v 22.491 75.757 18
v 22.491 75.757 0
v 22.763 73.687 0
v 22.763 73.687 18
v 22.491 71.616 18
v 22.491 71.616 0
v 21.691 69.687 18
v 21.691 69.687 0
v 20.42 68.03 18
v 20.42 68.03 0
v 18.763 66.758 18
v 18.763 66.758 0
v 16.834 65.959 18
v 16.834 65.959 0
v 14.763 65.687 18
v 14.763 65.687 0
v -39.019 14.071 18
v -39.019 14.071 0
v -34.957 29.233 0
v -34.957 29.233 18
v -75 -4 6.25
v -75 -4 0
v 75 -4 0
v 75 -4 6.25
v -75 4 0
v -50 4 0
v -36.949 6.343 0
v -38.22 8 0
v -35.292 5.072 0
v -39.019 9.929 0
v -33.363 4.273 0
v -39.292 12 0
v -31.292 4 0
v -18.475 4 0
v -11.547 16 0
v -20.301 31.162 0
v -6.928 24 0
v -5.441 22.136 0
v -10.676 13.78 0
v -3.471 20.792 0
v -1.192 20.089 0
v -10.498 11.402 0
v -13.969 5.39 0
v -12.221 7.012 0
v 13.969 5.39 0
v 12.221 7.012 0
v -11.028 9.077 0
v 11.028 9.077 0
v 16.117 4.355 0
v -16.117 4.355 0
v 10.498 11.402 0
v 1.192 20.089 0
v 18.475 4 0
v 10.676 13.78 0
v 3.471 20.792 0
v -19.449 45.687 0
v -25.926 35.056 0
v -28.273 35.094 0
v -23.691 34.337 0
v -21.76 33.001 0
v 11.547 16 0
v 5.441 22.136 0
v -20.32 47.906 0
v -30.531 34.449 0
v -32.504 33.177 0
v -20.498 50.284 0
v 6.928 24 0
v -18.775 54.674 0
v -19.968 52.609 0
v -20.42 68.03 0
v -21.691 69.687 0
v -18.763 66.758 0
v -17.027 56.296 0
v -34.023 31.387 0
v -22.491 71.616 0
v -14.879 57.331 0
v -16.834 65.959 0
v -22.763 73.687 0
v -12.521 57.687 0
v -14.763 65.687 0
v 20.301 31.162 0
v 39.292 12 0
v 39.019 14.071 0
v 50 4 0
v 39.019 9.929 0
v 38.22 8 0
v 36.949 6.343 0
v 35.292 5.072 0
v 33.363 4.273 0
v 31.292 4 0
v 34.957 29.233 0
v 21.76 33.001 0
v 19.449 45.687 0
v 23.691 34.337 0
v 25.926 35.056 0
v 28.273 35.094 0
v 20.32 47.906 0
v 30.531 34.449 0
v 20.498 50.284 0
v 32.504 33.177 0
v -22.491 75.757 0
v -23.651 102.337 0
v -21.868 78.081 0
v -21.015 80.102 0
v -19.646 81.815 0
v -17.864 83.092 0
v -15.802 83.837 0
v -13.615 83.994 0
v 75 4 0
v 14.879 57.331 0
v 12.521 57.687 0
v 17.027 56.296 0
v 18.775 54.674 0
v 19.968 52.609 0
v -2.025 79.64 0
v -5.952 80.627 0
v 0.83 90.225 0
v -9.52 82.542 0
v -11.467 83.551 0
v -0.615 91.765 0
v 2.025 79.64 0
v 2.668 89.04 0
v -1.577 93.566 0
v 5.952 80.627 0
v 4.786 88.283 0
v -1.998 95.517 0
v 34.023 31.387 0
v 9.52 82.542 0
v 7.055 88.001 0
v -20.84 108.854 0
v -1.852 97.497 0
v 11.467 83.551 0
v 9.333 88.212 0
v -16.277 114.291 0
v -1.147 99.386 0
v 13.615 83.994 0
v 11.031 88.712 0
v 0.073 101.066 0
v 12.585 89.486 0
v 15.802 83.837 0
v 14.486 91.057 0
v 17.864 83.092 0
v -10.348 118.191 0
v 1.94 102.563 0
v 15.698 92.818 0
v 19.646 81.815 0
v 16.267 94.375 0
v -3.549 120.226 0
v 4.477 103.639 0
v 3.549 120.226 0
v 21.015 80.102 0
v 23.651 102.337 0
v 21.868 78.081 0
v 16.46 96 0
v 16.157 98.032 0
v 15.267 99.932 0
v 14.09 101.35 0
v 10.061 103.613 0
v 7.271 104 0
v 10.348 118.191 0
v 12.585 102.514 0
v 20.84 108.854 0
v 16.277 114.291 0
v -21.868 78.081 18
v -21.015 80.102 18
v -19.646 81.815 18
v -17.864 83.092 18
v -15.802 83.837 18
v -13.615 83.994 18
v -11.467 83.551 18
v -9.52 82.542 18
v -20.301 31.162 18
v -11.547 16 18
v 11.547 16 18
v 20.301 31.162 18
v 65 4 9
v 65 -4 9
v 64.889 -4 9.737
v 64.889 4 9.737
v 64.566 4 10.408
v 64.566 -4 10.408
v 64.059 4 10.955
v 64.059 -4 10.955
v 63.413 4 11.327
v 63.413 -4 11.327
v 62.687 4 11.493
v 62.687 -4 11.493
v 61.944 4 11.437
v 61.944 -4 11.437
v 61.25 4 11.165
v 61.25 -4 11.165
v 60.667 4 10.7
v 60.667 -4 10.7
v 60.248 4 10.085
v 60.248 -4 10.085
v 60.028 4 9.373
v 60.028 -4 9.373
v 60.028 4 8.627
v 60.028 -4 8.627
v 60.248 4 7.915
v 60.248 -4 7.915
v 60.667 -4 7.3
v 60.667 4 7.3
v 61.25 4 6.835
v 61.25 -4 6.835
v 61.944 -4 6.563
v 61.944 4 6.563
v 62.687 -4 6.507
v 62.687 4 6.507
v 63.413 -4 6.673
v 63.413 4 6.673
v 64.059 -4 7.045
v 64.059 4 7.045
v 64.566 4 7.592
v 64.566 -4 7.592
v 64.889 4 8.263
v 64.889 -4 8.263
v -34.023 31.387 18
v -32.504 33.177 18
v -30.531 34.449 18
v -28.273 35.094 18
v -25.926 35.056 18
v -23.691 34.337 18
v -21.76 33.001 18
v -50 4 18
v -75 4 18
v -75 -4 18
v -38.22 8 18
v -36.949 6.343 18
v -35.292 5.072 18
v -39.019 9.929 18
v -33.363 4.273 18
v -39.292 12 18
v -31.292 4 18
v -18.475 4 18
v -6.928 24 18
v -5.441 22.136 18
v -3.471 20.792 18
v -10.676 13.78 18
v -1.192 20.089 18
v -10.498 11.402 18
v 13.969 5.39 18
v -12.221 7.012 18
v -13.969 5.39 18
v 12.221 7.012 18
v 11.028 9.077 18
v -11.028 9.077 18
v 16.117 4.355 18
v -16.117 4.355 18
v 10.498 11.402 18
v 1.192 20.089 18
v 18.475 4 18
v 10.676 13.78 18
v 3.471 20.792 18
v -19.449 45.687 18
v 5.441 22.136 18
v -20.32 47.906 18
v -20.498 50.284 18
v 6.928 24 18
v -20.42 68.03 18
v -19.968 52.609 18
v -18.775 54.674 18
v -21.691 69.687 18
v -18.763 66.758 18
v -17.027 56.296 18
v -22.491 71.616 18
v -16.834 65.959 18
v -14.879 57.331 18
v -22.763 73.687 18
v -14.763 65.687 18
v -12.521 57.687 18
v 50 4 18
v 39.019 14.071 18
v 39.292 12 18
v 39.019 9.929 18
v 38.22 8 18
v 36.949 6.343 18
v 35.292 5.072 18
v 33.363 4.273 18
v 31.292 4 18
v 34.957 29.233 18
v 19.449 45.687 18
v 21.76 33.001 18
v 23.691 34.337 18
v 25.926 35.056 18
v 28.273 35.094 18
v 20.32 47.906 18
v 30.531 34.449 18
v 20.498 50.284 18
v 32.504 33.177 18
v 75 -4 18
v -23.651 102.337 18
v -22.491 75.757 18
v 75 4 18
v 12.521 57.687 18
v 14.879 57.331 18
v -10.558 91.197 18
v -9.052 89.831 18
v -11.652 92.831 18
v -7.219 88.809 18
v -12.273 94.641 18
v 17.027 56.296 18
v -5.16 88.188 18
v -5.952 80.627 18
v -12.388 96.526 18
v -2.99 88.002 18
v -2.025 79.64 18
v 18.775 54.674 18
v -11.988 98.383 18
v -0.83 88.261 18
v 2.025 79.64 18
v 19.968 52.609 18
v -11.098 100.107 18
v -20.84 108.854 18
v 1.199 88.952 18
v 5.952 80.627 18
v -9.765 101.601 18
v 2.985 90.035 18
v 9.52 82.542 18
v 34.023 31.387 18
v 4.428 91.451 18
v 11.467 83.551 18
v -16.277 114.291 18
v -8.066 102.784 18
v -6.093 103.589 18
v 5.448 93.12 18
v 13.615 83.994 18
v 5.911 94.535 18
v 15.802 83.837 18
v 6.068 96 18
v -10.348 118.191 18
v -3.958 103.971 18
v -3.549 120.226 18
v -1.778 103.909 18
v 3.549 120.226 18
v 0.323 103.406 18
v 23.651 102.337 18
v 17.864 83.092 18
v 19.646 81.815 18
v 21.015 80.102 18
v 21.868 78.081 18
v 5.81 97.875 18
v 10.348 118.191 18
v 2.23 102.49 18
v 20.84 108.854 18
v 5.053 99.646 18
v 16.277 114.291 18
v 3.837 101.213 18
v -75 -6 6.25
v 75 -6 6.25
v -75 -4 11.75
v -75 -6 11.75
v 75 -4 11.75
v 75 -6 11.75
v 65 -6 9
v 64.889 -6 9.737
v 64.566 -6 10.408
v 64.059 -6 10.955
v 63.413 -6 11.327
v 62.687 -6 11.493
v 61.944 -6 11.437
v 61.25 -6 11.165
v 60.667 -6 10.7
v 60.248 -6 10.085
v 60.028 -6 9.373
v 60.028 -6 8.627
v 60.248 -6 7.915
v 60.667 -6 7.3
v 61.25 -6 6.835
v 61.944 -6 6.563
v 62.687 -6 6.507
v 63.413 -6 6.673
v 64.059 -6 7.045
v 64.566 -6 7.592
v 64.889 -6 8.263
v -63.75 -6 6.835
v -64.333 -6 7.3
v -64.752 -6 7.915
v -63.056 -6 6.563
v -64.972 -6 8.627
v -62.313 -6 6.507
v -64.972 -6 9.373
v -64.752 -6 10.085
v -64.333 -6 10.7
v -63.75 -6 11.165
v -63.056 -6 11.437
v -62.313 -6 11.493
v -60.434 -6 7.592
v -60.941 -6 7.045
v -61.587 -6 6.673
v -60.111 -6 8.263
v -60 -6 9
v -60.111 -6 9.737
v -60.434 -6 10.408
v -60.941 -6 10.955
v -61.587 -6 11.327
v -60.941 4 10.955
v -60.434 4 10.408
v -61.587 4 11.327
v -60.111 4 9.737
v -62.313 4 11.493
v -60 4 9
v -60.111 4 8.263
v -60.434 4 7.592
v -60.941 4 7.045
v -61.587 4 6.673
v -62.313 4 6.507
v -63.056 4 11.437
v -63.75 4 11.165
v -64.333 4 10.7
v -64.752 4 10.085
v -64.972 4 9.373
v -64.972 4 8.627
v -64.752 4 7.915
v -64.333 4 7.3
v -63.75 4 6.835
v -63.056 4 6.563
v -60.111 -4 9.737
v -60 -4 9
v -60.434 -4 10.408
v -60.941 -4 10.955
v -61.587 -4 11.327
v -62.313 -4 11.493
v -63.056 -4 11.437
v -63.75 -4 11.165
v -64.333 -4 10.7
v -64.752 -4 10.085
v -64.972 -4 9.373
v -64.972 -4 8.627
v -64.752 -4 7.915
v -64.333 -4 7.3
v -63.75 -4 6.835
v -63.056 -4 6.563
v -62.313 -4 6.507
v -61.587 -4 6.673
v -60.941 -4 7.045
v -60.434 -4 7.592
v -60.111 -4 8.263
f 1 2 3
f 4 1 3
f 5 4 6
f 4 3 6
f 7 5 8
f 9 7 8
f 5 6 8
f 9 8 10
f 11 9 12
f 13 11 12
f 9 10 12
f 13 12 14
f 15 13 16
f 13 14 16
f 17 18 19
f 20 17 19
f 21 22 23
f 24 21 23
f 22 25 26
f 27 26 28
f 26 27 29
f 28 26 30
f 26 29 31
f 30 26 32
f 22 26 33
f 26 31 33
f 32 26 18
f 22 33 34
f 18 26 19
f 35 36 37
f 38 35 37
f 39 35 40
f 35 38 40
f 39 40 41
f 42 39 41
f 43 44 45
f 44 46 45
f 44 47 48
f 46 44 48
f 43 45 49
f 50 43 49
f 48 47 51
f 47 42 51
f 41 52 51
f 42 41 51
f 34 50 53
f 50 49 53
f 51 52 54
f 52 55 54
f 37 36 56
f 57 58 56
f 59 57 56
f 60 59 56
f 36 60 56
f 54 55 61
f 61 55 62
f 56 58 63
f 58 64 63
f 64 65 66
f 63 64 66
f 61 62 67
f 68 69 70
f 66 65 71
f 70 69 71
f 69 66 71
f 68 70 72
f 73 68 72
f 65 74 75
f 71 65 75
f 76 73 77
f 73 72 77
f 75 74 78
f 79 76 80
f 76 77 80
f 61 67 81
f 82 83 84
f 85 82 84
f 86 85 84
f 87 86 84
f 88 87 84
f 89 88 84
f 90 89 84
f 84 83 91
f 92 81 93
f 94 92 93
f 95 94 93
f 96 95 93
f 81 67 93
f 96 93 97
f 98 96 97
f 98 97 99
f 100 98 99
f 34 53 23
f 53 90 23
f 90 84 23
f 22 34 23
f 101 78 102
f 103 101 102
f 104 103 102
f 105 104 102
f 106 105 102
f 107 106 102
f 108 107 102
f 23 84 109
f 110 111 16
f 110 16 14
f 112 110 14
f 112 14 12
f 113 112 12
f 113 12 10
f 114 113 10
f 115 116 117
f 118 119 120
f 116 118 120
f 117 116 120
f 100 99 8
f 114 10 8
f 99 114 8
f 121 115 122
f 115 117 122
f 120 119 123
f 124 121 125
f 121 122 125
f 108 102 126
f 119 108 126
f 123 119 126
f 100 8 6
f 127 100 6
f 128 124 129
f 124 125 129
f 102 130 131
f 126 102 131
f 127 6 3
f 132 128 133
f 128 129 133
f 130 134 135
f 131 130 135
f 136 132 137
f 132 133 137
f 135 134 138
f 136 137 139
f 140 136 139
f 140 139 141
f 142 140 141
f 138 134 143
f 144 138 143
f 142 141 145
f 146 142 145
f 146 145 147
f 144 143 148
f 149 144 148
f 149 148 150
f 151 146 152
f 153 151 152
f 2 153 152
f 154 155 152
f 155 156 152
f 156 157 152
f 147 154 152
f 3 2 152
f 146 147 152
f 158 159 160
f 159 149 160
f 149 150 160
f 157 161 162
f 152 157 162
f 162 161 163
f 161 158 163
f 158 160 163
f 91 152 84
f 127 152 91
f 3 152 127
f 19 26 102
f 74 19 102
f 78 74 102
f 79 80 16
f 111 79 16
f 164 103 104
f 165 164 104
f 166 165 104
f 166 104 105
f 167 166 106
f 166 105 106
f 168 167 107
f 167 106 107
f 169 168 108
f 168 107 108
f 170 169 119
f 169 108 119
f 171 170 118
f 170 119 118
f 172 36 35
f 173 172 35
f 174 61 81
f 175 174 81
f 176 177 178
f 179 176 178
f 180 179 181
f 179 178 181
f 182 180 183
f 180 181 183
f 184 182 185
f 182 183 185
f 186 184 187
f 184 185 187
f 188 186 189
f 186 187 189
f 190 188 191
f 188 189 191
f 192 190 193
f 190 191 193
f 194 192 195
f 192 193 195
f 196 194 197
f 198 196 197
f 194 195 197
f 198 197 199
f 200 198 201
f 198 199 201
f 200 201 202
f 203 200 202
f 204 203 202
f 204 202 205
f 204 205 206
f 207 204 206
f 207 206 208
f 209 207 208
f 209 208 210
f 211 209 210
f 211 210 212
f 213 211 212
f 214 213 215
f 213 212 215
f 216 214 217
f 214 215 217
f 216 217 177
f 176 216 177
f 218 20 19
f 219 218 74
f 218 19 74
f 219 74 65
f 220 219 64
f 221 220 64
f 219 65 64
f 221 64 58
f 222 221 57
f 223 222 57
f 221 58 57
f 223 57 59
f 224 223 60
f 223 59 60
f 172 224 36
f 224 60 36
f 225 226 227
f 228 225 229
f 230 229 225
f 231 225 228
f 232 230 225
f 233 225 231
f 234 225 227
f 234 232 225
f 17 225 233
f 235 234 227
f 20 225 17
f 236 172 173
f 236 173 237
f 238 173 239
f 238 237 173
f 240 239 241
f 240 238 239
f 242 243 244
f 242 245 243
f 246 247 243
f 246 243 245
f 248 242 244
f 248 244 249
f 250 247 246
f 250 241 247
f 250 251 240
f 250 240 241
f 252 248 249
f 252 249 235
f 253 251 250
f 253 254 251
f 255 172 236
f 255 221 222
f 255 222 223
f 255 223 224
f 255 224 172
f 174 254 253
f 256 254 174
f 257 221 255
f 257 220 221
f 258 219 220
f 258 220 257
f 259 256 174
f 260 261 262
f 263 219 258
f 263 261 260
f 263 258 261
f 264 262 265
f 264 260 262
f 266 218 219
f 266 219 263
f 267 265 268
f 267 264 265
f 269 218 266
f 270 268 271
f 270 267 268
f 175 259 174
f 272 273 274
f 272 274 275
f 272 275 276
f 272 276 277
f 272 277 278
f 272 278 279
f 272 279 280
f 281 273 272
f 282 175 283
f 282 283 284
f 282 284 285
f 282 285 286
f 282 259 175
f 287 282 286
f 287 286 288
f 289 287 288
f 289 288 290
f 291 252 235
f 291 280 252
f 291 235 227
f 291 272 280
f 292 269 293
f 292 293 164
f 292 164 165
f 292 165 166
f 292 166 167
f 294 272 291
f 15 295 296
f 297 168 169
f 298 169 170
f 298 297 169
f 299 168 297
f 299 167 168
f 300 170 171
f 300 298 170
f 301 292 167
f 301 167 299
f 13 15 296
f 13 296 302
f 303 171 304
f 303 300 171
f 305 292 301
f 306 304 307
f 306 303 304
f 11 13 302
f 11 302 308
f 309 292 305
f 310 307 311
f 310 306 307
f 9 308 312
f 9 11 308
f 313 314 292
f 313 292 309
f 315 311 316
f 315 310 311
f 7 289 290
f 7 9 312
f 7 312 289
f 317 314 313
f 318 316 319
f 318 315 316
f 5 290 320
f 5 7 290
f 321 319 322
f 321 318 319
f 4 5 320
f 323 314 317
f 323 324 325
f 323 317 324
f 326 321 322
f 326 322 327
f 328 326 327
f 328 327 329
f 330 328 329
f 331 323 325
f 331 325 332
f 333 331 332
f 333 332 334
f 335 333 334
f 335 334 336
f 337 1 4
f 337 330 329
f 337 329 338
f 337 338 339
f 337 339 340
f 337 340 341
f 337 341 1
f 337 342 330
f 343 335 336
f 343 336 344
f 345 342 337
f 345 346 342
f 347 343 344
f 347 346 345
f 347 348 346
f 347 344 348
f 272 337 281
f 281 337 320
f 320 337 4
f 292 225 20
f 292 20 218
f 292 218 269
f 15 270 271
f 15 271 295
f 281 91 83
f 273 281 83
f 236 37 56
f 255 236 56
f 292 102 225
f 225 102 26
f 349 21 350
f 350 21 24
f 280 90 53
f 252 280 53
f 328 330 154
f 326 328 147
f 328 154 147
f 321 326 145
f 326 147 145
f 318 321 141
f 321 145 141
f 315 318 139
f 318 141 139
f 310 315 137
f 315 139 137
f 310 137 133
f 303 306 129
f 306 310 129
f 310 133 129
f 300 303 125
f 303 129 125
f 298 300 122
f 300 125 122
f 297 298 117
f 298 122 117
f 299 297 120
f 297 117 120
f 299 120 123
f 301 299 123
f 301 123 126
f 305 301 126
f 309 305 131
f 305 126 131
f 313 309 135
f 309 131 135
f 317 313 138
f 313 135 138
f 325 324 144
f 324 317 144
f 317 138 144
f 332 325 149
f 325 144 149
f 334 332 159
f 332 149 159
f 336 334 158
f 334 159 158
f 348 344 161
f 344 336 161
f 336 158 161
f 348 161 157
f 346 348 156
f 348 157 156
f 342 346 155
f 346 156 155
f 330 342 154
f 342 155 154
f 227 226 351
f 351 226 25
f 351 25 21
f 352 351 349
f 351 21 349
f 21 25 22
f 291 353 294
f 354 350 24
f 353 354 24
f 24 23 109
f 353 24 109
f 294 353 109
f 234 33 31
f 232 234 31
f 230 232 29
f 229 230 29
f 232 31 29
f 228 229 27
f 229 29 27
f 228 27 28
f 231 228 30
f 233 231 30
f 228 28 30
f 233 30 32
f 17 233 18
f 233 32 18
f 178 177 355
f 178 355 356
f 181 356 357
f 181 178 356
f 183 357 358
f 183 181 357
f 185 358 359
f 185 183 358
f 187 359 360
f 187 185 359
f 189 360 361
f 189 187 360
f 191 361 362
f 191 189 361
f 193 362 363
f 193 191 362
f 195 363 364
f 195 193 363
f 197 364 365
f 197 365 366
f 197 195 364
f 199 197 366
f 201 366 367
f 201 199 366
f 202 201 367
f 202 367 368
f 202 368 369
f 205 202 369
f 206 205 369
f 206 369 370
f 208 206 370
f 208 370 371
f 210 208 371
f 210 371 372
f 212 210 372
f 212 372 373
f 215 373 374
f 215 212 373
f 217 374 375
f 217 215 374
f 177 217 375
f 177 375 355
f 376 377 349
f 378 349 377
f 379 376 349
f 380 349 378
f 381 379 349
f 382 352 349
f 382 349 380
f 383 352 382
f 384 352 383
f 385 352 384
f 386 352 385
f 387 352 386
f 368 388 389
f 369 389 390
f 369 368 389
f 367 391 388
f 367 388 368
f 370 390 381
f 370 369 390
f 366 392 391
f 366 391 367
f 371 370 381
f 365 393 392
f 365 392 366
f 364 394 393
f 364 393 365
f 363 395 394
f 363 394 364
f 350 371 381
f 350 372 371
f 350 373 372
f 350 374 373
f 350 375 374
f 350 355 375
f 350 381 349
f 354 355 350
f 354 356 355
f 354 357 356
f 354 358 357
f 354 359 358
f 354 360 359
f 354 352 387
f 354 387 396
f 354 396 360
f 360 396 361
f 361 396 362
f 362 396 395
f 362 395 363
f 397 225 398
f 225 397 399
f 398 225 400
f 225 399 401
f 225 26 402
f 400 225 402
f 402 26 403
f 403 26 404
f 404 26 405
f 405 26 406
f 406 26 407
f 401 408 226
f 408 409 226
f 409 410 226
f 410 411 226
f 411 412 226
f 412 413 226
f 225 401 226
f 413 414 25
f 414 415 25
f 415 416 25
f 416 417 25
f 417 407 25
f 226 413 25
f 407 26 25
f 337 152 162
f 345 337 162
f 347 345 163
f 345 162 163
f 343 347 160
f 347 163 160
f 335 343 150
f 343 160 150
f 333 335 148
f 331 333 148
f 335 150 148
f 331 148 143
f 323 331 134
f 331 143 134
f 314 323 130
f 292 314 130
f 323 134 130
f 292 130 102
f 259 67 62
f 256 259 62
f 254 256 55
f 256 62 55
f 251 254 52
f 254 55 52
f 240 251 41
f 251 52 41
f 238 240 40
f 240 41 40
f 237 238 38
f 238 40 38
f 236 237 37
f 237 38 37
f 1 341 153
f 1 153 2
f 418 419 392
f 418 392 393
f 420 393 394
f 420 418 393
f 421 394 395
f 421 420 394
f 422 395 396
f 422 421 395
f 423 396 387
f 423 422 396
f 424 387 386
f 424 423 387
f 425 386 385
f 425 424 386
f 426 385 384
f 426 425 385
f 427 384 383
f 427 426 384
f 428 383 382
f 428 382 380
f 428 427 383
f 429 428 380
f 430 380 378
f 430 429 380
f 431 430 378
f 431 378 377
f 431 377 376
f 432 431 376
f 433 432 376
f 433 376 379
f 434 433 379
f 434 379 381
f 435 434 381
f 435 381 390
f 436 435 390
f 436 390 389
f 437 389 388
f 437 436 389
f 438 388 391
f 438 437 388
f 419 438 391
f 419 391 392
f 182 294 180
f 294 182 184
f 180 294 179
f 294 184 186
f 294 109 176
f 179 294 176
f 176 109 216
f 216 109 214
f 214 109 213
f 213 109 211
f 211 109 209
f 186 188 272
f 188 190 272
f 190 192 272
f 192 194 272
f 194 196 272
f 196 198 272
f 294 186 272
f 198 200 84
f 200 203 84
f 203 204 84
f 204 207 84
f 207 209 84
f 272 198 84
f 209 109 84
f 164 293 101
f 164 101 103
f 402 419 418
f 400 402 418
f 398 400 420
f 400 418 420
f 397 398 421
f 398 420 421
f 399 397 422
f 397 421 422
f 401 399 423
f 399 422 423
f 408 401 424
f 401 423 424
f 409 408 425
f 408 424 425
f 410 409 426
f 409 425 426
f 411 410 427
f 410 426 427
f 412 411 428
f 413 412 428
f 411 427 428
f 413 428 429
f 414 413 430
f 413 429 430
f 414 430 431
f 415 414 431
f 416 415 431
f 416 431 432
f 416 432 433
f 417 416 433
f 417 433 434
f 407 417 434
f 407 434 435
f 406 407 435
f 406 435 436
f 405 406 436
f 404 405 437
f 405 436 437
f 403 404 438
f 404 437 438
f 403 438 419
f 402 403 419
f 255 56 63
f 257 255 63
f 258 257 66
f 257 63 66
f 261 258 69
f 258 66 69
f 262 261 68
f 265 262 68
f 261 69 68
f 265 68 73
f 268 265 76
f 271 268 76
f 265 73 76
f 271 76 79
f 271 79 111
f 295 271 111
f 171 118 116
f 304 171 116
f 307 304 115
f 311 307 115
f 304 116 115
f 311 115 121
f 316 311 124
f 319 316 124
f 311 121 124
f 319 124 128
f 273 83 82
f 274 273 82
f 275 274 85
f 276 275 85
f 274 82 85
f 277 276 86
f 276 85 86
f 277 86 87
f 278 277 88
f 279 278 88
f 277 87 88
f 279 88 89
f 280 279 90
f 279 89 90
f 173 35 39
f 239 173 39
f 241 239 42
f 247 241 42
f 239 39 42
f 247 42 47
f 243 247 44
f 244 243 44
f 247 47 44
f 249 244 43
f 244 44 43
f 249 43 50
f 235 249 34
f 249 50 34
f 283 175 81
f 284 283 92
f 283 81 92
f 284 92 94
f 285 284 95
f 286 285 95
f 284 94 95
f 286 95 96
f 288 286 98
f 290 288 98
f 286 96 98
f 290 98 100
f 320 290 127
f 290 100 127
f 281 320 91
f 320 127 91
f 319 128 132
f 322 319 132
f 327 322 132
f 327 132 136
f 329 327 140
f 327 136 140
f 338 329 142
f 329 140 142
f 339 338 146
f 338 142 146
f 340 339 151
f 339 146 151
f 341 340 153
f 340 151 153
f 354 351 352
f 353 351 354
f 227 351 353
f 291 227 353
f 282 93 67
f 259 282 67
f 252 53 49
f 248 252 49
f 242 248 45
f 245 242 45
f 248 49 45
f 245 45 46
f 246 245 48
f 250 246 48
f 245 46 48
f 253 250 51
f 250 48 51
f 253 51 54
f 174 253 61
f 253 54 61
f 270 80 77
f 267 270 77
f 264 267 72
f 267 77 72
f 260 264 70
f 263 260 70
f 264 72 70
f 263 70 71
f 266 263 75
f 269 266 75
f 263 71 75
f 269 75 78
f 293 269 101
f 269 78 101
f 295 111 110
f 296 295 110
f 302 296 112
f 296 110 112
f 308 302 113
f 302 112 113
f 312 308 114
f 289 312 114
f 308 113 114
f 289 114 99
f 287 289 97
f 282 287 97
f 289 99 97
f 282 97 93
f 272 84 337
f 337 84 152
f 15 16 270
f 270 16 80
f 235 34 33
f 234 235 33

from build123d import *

# Parameters (mm, degrees)
F6_DEPTH       = 18
F7_W           = 150
F7_H           = 5.5
F7_R           = 2.5
F8_DEPTH       = 2
F9_DEPTH       = 8
F5_R           = 8
F10_DEPTH      = 40
F10_DEPTH_BACK = 30


with BuildPart() as f6:
    # F0 (on Top) → F6 (new body)
    with BuildSketch(Plane.XY):
        with BuildLine():
            Line((-75, -4), (75, -4))
            Line((75, -4), (75, 4))
            Line((75, 4), (50, 4))
            Line((50, 4), (23.6506350946, 102.3371685741))
            ThreePointArc((23.6506350946, 102.3371685741), (0, 120.484939165), (-23.6506350946, 102.3371685741))
            Line((-23.6506350946, 102.3371685741), (-50, 4))
            Line((-50, 4), (-75, 4))
            Line((-75, 4), (-75, -4))
        make_face()
        with BuildLine():
            ThreePointArc((-31.291987574, 4), (-37.6388142963, 7.1299085679), (-39.0193941843, 14.0705523608))
            Line((-39.0193941843, 14.0705523608), (-34.9566380514, 29.2329646678))
            ThreePointArc((-34.9566380514, 29.2329646678), (-28.2734409788, 35.0939711979), (-20.3010282108, 31.1624123069))
            Line((-20.3010282108, 31.1624123069), (-11.5470053838, 16))
            ThreePointArc((-11.5470053838, 16), (-11.5470053838, 8), (-18.4752086141, 4))
            Line((-18.4752086141, 4), (-31.291987574, 4))
        make_face(mode=Mode.SUBTRACT)
        with BuildLine():
            ThreePointArc((39.0193941843, 14.0705523608), (37.6388142963, 7.1299085679), (31.291987574, 4))
            Line((31.291987574, 4), (18.4752086141, 4))
            ThreePointArc((18.4752086141, 4), (11.5470053838, 8), (11.5470053838, 16))
            Line((11.5470053838, 16), (20.3010282108, 31.1624123069))
            ThreePointArc((20.3010282108, 31.1624123069), (28.2734409788, 35.0939711979), (34.9566380514, 29.2329646678))
            Line((34.9566380514, 29.2329646678), (39.0193941843, 14.0705523608))
        make_face(mode=Mode.SUBTRACT)
        with BuildLine():
            ThreePointArc((-19.4489291724, 45.6865334795), (-19.4489291724, 53.6865334795), (-12.5207259422, 57.6865334795))
            Line((-12.5207259422, 57.6865334795), (12.5207259422, 57.6865334795))
            ThreePointArc((12.5207259422, 57.6865334795), (19.4489291724, 53.6865334795), (19.4489291724, 45.6865334795))
            Line((19.4489291724, 45.6865334795), (6.9282032303, 24))
            ThreePointArc((6.9282032303, 24), (0, 20), (-6.9282032303, 24))
            Line((-6.9282032303, 24), (-19.4489291724, 45.6865334795))
        make_face(mode=Mode.SUBTRACT)
        with BuildLine():
            Line((14.7631307443, 65.6865334795), (-14.7631307443, 65.6865334795))
            ThreePointArc((-14.7631307443, 65.6865334795), (-21.1099574666, 68.8164420474), (-22.4905373546, 75.7570858403))
            Line((-22.4905373546, 75.7570858403), (-21.8677224991, 78.0814625246))
            ThreePointArc((-21.8677224991, 78.0814625246), (-16.8583855127, 83.5350112742), (-9.5202297882, 82.5419747342))
            ThreePointArc((-9.5202297882, 82.5419747342), (0, 79.515060835), (9.5202297882, 82.5419747342))
            ThreePointArc((9.5202297882, 82.5419747342), (16.8583855127, 83.5350112742), (21.8677224991, 78.0814625246))
            Line((21.8677224991, 78.0814625246), (22.4905373546, 75.7570858403))
            ThreePointArc((22.4905373546, 75.7570858403), (21.1099574666, 68.8164420474), (14.7631307443, 65.6865334795))
        make_face(mode=Mode.SUBTRACT)
    extrude(amount=F6_DEPTH)

    # F7 (on face) → F8 (join)
    with BuildSketch(Plane.XZ.offset(4)):
        with Locations((0, 9)):
            Rectangle(F7_W, F7_H)
        with Locations((-62.5, 9)):
            Circle(F7_R, mode=Mode.SUBTRACT)
        with Locations((62.5, 9)):
            Circle(F7_R, mode=Mode.SUBTRACT)
    extrude(amount=F8_DEPTH)

    # F9 (cut): faces of the model
    f9_faces = [f6.faces().sort_by_distance(p)[0] for p in [
        (62.5, -4, 9),
        (-62.5, -4, 9),
    ]]
    extrude(f9_faces, amount=-F9_DEPTH, mode=Mode.SUBTRACT)

    # F5 (on face) → F10 (cut, two sides)
    with BuildSketch(Plane(origin=(3.146304925, 0, -5.4495599862), x_dir=(0.8660254038, 0, 0.5), z_dir=(0.5, 0, -0.8660254038))) as f10_sk:
        with Locations((6.2546720728, -96)):
            Circle(F5_R)
    extrude(amount=-F10_DEPTH, mode=Mode.SUBTRACT)
    extrude(f10_sk.sketch, amount=F10_DEPTH_BACK, mode=Mode.SUBTRACT)


solid = f6.part
